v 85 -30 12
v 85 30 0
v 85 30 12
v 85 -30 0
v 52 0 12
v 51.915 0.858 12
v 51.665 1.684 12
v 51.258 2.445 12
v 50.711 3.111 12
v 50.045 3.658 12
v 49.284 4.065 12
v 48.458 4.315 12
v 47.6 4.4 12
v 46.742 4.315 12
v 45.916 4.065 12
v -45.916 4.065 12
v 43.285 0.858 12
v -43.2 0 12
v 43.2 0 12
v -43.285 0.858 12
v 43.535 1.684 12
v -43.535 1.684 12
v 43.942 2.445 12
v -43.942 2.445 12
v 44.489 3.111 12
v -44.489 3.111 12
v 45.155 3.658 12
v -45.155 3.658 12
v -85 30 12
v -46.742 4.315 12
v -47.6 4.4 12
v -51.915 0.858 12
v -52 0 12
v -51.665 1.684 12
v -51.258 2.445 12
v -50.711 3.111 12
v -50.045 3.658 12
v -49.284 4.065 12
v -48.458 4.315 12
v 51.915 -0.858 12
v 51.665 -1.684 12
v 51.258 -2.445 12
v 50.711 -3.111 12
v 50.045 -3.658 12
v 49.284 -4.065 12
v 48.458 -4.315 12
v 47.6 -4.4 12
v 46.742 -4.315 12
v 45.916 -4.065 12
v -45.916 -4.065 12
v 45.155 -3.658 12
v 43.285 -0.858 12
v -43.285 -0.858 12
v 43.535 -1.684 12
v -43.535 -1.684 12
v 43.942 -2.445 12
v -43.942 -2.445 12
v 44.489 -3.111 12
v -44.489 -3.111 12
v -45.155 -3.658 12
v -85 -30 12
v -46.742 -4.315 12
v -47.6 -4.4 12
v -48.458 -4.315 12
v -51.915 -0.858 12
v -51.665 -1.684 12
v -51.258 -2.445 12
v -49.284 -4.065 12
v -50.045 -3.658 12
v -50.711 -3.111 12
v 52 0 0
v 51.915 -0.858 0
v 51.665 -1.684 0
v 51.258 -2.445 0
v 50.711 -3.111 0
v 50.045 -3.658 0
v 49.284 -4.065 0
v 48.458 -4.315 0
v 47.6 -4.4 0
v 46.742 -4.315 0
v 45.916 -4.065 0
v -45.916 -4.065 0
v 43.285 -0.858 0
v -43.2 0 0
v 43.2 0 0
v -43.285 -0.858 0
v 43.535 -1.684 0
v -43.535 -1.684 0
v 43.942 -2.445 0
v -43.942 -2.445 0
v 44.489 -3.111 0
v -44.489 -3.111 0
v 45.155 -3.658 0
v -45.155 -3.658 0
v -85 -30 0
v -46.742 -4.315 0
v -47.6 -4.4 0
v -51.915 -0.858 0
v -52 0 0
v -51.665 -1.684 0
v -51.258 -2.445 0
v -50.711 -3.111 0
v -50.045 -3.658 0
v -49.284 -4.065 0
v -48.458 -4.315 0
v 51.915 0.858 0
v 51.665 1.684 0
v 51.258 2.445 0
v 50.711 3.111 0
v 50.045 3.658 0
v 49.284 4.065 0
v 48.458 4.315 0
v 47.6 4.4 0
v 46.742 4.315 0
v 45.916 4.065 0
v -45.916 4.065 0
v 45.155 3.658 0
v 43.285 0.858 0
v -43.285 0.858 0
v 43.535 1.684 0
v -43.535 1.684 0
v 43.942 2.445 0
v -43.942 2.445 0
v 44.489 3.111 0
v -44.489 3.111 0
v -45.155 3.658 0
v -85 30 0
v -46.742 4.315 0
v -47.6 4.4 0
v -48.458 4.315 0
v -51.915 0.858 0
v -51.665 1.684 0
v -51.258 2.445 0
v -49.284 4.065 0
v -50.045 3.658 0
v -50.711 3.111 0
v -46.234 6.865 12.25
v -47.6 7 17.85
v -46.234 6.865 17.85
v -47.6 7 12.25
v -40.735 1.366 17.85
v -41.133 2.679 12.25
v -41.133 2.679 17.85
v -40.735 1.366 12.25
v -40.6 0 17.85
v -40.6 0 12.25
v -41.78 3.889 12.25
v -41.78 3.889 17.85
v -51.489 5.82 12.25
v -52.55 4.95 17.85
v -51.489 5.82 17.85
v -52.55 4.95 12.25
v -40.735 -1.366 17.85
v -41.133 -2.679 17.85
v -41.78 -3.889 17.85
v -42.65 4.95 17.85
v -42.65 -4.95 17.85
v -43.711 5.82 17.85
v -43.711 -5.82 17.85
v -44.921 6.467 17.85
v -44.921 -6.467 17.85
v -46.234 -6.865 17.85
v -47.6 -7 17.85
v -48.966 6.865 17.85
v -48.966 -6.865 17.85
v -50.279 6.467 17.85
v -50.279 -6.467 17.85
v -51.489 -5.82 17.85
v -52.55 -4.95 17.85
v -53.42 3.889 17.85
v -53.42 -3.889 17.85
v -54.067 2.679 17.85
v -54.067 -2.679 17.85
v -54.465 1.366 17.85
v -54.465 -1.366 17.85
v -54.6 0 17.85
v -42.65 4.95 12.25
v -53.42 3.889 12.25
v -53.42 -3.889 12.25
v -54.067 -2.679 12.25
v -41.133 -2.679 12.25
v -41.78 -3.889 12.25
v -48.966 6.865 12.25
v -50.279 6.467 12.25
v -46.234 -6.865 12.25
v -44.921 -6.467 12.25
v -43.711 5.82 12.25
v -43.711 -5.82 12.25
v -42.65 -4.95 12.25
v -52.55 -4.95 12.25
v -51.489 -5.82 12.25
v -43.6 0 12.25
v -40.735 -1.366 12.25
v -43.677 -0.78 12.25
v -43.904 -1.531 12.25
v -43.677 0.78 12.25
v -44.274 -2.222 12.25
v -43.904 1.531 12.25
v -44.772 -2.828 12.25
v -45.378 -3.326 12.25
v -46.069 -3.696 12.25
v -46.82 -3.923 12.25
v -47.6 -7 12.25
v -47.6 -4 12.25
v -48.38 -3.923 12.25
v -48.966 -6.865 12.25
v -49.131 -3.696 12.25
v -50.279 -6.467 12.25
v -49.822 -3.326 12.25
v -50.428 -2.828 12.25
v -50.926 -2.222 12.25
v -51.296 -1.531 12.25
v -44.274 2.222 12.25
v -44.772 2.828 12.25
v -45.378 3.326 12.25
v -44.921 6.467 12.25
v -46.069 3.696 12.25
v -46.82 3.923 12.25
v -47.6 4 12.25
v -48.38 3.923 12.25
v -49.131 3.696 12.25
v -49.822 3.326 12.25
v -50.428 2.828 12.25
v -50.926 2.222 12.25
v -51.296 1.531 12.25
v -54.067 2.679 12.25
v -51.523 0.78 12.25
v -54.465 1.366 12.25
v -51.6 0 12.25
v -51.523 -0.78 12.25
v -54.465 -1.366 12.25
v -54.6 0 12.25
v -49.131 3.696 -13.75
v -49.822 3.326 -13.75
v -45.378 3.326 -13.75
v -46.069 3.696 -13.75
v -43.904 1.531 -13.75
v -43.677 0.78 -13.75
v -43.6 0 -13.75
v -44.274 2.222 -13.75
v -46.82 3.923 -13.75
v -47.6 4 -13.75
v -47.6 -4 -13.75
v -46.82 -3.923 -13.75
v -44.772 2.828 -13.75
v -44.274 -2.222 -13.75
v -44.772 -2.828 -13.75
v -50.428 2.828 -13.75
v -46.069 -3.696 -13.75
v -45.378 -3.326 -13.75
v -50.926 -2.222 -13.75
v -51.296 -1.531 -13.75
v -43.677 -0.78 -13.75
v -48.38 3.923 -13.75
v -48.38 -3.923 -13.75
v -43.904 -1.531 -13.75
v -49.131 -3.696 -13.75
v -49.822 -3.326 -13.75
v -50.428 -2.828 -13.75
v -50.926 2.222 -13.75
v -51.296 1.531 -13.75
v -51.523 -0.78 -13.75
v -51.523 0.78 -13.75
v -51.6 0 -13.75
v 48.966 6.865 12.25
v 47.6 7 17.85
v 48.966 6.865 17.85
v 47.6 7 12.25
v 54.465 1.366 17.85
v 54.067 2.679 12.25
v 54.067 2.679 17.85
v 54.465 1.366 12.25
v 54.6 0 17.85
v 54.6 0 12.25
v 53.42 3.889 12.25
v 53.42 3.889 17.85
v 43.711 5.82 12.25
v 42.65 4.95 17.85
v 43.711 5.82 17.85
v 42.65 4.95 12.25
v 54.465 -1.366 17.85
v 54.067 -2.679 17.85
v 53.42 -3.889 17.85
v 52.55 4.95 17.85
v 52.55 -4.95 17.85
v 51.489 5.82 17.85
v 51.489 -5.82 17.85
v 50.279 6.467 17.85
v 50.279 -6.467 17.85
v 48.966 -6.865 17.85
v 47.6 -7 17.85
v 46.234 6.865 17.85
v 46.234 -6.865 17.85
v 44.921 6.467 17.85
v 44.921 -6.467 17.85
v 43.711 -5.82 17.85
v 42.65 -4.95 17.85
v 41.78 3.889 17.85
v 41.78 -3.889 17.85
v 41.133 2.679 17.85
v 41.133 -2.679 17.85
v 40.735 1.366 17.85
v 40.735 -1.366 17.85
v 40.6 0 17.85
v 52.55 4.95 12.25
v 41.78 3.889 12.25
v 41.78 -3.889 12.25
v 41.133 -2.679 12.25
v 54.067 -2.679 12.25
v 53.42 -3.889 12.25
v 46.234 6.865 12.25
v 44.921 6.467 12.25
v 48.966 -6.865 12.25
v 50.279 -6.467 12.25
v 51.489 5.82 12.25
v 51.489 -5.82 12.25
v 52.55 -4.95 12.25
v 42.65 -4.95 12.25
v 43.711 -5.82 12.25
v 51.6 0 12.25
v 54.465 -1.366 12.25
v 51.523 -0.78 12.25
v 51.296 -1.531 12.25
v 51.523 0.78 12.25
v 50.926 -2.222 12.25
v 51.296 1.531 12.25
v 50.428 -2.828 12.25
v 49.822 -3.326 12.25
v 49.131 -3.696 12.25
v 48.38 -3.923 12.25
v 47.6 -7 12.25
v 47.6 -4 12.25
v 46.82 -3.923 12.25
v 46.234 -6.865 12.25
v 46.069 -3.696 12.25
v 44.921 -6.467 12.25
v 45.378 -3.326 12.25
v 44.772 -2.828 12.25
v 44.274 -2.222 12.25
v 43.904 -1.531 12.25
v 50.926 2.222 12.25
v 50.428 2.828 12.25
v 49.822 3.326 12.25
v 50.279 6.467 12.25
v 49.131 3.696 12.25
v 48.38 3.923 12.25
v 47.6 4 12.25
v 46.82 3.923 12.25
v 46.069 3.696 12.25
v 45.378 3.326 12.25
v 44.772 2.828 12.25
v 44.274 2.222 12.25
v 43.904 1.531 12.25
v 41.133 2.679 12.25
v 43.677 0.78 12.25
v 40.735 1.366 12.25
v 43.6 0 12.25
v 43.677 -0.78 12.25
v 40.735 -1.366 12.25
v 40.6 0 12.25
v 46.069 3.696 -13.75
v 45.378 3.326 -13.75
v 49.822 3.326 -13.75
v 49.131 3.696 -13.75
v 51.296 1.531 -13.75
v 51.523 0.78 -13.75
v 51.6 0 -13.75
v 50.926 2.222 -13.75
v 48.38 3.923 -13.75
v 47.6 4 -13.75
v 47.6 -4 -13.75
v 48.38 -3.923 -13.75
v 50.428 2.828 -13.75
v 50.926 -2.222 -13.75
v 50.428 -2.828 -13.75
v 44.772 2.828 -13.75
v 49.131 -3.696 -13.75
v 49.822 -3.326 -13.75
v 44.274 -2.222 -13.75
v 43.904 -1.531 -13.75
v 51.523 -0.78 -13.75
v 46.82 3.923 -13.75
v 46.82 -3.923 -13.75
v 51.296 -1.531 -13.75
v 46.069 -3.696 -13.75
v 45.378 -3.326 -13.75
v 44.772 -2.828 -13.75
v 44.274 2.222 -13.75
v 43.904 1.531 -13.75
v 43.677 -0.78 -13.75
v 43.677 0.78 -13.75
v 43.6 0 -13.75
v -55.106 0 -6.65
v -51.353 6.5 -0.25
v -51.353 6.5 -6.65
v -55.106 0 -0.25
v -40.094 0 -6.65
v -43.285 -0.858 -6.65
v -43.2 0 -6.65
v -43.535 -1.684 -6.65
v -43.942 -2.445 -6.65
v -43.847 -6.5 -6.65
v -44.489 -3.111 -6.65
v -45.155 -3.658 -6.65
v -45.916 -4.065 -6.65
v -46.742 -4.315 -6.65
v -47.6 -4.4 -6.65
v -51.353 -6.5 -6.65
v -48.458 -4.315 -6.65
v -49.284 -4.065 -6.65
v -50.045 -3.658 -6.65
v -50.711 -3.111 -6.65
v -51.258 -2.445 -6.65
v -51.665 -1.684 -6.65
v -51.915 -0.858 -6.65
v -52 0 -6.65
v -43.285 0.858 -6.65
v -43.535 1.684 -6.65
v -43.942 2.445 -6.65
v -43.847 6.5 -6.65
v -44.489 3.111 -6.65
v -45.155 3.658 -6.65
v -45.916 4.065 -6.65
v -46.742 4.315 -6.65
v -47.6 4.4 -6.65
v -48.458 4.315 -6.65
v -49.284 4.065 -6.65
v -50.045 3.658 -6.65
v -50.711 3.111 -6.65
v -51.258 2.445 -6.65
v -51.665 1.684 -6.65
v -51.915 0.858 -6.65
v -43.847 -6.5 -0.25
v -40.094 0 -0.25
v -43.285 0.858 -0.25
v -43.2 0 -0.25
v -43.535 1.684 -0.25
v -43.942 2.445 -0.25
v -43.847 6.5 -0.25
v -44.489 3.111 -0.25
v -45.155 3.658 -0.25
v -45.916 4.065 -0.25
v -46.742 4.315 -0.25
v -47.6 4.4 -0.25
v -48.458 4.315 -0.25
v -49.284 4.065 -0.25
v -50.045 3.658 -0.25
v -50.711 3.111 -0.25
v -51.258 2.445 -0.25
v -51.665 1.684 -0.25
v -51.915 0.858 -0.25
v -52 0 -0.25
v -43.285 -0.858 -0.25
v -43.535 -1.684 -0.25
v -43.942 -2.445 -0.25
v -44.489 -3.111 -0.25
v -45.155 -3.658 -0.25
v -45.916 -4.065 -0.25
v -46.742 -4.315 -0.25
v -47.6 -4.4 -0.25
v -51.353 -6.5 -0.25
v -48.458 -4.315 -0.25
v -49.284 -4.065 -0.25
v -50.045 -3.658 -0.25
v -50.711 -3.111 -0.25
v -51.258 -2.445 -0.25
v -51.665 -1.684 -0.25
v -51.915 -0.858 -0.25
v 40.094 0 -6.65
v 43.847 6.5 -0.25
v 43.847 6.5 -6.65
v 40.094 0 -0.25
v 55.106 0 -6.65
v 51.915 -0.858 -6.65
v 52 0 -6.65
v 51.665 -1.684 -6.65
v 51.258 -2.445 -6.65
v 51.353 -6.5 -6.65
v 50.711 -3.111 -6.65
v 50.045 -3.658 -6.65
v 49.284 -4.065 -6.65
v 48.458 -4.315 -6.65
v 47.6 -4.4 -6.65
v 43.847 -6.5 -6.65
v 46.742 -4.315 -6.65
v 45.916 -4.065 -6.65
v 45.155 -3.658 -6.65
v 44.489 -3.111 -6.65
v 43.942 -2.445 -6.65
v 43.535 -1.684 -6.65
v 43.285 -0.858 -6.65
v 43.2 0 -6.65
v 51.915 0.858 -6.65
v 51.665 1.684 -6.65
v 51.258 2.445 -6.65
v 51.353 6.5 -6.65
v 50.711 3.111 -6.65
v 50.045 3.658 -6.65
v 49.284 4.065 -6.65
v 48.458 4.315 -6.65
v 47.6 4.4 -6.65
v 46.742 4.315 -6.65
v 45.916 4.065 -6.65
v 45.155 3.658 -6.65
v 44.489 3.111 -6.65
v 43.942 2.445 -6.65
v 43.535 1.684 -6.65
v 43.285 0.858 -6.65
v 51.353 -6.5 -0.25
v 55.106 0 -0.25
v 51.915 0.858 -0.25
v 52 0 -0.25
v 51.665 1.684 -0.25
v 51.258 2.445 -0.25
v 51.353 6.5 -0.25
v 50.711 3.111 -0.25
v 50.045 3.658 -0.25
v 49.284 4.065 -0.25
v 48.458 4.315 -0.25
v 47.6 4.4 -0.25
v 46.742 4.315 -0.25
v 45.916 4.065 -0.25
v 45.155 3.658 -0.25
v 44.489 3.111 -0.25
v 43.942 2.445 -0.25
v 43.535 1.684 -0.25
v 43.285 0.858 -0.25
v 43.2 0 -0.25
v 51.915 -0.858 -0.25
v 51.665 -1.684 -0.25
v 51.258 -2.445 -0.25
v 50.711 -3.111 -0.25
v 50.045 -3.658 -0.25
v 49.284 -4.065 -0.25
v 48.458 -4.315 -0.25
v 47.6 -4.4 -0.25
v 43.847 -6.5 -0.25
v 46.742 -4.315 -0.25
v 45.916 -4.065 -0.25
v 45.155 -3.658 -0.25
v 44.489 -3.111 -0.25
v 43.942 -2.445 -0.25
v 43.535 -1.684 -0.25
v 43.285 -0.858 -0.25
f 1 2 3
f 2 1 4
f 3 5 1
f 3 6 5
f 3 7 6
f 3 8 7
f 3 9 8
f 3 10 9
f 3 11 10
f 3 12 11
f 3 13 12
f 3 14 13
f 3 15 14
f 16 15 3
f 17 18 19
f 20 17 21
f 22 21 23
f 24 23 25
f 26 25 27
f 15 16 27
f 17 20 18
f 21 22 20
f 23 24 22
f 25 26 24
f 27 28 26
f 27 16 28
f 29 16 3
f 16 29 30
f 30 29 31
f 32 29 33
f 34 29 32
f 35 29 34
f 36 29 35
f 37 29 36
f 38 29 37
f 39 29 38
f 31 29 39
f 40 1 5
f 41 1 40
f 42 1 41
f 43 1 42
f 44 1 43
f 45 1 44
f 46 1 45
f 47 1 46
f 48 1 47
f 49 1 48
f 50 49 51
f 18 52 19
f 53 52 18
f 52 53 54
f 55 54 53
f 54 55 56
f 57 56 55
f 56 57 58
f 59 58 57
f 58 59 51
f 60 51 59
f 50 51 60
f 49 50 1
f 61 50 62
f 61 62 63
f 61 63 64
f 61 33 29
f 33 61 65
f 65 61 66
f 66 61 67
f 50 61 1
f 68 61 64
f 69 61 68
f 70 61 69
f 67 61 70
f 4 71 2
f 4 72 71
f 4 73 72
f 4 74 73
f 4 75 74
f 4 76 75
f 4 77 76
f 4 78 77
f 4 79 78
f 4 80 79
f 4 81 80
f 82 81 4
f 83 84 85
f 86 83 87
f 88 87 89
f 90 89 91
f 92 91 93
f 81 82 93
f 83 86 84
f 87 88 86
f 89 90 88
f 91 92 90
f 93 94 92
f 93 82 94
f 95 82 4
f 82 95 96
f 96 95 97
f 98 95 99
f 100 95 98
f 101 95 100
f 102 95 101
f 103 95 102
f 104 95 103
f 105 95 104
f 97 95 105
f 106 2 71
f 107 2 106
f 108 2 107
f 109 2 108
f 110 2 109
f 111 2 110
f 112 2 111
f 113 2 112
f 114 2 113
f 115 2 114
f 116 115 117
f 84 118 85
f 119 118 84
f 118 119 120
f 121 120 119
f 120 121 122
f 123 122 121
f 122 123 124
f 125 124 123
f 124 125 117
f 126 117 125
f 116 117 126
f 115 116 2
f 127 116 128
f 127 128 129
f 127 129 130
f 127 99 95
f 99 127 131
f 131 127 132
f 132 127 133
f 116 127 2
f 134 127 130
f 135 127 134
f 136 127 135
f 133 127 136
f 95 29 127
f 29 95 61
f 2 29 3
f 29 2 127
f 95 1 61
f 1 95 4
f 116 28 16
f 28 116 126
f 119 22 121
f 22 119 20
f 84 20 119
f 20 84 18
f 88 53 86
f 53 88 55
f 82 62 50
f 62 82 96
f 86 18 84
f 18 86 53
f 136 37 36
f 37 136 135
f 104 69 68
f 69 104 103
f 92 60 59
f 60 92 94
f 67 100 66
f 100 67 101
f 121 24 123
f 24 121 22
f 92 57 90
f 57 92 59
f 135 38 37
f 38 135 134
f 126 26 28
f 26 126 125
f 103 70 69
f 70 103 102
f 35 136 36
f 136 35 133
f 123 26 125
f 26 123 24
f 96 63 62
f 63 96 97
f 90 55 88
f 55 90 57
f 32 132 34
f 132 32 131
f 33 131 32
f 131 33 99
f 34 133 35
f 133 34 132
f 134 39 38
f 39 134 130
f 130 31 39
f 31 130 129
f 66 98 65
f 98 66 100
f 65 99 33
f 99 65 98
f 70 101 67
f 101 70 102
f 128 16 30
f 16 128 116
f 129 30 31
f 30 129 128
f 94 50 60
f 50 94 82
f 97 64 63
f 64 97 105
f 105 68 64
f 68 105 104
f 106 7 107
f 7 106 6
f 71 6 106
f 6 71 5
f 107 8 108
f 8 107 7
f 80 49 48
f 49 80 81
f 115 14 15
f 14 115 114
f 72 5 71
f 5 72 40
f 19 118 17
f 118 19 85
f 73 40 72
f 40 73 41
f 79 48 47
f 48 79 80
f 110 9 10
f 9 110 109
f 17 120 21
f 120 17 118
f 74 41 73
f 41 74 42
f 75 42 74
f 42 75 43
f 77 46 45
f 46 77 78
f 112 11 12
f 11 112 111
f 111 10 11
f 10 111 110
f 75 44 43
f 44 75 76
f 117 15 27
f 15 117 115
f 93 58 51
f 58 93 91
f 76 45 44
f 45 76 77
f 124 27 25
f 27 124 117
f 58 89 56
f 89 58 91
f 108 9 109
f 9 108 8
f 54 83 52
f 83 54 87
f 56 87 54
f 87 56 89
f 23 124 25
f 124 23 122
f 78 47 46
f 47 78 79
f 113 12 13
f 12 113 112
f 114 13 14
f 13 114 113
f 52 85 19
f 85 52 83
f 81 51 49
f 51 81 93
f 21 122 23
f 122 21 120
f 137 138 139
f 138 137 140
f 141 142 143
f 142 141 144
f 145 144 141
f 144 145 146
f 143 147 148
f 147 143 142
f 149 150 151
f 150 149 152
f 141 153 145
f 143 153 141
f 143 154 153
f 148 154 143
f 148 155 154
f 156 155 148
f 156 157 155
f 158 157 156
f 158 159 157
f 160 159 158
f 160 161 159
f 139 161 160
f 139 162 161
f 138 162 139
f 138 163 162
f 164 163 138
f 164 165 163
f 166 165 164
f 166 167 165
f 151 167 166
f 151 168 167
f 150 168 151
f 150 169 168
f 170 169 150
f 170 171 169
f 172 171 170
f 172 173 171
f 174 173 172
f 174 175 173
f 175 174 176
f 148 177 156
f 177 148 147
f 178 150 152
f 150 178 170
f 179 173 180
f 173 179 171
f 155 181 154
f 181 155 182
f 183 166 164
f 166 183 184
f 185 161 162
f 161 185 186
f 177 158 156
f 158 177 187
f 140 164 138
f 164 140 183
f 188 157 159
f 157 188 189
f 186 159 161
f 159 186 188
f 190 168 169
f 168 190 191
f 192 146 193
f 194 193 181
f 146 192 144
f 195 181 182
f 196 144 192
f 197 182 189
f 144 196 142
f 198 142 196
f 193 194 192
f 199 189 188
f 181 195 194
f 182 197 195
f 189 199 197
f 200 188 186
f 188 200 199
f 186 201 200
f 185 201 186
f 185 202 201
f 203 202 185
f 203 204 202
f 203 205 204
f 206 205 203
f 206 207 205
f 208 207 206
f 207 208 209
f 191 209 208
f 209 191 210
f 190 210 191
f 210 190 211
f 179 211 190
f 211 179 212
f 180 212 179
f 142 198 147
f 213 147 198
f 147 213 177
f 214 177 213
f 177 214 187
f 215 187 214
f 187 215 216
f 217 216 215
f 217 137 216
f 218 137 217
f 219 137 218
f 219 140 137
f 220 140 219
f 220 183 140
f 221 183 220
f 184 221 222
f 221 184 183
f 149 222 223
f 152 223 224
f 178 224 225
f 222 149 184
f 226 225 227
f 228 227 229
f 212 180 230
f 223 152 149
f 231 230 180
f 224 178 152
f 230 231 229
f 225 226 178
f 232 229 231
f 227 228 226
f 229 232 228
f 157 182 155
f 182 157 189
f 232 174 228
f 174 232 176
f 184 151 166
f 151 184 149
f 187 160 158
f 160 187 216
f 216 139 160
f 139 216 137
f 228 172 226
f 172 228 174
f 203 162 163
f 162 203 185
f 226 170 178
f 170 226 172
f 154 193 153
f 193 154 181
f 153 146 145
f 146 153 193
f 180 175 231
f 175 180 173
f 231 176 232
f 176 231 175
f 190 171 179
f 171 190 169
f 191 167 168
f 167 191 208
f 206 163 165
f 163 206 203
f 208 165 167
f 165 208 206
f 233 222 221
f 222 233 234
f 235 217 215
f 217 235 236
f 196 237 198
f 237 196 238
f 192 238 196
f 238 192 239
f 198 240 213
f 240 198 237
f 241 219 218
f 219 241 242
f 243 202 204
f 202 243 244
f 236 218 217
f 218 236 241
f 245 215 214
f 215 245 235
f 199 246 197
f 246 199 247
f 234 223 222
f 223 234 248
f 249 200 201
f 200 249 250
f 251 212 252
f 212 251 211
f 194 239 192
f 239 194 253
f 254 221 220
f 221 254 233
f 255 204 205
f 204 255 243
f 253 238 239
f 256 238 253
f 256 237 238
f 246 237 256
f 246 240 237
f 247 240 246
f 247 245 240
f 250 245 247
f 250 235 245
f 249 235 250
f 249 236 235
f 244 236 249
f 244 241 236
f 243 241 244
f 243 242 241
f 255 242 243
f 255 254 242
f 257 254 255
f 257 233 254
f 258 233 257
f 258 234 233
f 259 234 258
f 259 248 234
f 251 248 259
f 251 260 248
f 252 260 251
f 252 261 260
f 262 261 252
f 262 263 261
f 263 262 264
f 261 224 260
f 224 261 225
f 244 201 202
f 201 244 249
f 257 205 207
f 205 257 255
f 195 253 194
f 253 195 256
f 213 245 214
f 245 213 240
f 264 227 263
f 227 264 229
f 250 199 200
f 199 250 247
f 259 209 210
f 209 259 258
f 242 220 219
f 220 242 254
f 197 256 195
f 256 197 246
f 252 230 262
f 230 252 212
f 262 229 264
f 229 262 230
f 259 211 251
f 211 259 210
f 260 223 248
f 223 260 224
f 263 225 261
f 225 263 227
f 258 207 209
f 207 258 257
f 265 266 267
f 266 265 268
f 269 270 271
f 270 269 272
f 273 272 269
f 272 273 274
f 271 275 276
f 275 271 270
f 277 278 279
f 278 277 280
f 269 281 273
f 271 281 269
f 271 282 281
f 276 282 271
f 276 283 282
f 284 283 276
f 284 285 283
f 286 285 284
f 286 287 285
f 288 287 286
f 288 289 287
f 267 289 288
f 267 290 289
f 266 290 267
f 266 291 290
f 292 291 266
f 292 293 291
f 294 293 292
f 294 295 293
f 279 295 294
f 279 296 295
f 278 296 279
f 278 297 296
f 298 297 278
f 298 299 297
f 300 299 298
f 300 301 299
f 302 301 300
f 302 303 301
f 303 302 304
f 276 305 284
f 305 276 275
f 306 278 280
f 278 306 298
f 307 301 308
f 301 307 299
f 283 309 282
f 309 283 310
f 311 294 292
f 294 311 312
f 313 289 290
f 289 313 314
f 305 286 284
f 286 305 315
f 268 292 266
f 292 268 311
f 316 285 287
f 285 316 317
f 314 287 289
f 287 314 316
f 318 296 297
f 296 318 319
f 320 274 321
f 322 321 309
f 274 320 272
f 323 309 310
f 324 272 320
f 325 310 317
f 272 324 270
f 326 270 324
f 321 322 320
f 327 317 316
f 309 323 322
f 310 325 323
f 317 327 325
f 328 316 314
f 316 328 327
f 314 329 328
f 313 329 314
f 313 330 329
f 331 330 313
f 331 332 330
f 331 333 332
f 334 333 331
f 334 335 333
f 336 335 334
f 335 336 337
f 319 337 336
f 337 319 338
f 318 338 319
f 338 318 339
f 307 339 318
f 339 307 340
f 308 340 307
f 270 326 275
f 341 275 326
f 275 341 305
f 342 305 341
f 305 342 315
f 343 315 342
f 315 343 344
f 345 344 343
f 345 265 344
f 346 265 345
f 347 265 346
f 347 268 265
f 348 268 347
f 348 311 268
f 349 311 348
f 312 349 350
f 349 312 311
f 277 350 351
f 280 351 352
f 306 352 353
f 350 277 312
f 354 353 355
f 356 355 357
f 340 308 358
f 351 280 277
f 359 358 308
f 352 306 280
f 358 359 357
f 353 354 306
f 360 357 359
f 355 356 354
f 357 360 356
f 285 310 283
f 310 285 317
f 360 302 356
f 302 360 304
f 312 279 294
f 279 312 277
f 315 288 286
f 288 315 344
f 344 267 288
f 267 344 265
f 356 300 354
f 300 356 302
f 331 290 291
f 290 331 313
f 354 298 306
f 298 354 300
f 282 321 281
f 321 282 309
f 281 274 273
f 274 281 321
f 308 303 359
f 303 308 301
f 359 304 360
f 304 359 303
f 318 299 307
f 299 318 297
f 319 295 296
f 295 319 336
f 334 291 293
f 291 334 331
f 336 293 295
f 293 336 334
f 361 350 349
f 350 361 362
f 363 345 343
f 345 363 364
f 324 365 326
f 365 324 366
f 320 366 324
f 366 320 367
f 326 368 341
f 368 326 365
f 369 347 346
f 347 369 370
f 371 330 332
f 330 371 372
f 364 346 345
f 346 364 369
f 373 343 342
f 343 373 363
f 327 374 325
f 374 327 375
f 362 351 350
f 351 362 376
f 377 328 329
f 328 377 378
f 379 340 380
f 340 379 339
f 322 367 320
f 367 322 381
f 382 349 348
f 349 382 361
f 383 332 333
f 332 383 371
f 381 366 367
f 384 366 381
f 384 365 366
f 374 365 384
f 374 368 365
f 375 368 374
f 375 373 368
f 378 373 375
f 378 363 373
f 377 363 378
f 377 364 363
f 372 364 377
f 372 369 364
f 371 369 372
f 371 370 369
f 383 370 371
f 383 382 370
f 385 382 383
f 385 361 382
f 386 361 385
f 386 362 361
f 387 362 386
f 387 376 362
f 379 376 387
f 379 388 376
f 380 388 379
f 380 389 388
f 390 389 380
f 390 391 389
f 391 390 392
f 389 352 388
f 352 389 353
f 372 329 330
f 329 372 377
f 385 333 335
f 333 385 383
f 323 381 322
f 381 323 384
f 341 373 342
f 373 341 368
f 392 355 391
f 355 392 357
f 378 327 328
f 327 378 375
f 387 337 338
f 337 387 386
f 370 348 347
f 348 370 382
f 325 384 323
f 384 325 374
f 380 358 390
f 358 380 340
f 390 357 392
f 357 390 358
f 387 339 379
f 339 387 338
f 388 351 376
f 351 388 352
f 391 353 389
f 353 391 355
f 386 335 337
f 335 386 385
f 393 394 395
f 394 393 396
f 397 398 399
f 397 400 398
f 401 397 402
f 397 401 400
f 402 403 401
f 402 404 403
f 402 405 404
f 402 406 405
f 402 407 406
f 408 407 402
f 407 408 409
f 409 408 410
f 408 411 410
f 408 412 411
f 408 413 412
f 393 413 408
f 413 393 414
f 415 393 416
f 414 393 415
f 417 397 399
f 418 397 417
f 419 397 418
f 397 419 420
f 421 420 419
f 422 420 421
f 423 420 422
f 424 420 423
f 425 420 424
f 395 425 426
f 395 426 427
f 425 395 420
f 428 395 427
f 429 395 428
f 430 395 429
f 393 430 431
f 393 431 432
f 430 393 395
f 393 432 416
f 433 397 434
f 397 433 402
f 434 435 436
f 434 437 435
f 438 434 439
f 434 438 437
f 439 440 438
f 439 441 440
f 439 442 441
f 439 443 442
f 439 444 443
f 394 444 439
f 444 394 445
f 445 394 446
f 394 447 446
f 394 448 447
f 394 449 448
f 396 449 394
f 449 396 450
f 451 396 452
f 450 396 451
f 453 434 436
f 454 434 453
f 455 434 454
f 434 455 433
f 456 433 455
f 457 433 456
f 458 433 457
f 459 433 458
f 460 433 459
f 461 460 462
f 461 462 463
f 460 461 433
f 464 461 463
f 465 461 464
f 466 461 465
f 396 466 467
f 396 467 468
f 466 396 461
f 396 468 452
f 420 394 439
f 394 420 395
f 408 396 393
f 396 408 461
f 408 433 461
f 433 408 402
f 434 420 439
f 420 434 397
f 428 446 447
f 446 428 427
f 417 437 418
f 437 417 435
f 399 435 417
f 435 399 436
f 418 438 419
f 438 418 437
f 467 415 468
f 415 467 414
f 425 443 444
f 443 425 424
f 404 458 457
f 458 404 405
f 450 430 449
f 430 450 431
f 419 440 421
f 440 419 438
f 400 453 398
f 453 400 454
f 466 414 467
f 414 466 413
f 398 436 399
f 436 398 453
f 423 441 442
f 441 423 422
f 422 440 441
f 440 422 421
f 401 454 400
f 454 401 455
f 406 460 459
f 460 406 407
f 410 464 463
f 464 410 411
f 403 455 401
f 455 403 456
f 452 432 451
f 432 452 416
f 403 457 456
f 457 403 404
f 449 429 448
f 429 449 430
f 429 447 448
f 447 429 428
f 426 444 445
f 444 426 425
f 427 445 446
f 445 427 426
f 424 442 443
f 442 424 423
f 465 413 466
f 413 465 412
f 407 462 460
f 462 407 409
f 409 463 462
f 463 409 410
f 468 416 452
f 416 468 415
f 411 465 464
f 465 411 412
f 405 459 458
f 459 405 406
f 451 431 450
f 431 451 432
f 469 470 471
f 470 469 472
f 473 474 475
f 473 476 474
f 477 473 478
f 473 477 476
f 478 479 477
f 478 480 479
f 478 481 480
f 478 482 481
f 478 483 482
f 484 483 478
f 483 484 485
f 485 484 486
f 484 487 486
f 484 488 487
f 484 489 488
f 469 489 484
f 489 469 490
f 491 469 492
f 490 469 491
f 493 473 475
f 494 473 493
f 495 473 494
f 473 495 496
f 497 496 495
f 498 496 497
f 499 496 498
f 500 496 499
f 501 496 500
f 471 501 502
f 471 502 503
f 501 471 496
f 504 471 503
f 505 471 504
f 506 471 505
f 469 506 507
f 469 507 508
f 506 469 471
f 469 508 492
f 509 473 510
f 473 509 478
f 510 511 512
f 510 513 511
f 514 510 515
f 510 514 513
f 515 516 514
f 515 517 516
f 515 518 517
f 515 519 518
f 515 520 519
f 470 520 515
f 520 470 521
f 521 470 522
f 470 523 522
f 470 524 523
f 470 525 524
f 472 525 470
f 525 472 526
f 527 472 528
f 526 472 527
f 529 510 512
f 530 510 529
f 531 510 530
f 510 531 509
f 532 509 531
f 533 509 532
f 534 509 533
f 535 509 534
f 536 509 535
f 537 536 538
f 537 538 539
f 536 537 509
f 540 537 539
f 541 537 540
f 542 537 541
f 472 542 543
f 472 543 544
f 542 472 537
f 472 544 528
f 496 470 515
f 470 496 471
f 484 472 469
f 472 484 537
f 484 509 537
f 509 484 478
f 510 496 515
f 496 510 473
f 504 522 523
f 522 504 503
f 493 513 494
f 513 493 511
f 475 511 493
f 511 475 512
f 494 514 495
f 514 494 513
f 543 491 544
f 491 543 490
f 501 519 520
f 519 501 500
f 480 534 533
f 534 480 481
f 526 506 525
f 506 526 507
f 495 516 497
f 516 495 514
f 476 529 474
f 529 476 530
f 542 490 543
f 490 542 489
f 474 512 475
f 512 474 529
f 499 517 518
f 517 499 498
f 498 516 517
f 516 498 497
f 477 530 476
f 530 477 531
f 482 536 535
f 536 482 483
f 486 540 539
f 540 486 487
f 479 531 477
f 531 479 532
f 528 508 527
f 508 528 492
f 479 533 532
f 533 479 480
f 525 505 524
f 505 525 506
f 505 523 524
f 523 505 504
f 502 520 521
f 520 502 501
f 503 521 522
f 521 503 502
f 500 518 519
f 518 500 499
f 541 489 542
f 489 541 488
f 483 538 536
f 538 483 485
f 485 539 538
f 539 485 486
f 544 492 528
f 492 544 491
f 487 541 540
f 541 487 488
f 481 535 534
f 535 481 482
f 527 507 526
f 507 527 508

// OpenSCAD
$fn = 32;

// ------------------------------------------------------------------------
// Bolted plate: 170 x 60 x 12 mm plate, 2 fasteners
// Every part is its own module, assembly() places them once.
// ------------------------------------------------------------------------

// --- part 1 ---
module plate() {
  difference() {
    translate([-85, -30, 0]) cube([170, 60, 12]);
    translate([-47.6, 0, -1]) cylinder(h = 14, d = 8.8);
    translate([47.6, 0, -1]) cylinder(h = 14, d = 8.8);
  }
}

// --- part 2 ---
module bolt1() {
  cylinder(h = 5.6, d = 14);
  translate([0, 0, -26]) cylinder(h = 26, d = 8);
}

// --- part 3 ---
module bolt2() {
  cylinder(h = 5.6, d = 14);
  translate([0, 0, -26]) cylinder(h = 26, d = 8);
}

// --- part 4 ---
module nut1() {
  difference() {
    linear_extrude(height = 6.4) polygon(points = [[7.506, 0], [3.753, 6.5], [-3.753, 6.5], [-7.506, 0], [-3.753, -6.5], [3.753, -6.5]]);
    translate([0, 0, -1]) cylinder(h = 8.4, d = 8.8);
  }
}

// --- part 5 ---
module nut2() {
  difference() {
    linear_extrude(height = 6.4) polygon(points = [[7.506, 0], [3.753, 6.5], [-3.753, 6.5], [-7.506, 0], [-3.753, -6.5], [3.753, -6.5]]);
    translate([0, 0, -1]) cylinder(h = 8.4, d = 8.8);
  }
}

// --- assembly ---
module assembly() {
  translate([0, 0, 0]) rotate([0, 0, 0]) plate();
  translate([-47.6, 0, 12.25]) rotate([0, 0, 0]) bolt1();
  translate([47.6, 0, 12.25]) rotate([0, 0, 0]) bolt2();
  translate([-47.6, 0, -6.65]) rotate([0, 0, 0]) nut1();
  translate([47.6, 0, -6.65]) rotate([0, 0, 0]) nut2();
}

assembly();
